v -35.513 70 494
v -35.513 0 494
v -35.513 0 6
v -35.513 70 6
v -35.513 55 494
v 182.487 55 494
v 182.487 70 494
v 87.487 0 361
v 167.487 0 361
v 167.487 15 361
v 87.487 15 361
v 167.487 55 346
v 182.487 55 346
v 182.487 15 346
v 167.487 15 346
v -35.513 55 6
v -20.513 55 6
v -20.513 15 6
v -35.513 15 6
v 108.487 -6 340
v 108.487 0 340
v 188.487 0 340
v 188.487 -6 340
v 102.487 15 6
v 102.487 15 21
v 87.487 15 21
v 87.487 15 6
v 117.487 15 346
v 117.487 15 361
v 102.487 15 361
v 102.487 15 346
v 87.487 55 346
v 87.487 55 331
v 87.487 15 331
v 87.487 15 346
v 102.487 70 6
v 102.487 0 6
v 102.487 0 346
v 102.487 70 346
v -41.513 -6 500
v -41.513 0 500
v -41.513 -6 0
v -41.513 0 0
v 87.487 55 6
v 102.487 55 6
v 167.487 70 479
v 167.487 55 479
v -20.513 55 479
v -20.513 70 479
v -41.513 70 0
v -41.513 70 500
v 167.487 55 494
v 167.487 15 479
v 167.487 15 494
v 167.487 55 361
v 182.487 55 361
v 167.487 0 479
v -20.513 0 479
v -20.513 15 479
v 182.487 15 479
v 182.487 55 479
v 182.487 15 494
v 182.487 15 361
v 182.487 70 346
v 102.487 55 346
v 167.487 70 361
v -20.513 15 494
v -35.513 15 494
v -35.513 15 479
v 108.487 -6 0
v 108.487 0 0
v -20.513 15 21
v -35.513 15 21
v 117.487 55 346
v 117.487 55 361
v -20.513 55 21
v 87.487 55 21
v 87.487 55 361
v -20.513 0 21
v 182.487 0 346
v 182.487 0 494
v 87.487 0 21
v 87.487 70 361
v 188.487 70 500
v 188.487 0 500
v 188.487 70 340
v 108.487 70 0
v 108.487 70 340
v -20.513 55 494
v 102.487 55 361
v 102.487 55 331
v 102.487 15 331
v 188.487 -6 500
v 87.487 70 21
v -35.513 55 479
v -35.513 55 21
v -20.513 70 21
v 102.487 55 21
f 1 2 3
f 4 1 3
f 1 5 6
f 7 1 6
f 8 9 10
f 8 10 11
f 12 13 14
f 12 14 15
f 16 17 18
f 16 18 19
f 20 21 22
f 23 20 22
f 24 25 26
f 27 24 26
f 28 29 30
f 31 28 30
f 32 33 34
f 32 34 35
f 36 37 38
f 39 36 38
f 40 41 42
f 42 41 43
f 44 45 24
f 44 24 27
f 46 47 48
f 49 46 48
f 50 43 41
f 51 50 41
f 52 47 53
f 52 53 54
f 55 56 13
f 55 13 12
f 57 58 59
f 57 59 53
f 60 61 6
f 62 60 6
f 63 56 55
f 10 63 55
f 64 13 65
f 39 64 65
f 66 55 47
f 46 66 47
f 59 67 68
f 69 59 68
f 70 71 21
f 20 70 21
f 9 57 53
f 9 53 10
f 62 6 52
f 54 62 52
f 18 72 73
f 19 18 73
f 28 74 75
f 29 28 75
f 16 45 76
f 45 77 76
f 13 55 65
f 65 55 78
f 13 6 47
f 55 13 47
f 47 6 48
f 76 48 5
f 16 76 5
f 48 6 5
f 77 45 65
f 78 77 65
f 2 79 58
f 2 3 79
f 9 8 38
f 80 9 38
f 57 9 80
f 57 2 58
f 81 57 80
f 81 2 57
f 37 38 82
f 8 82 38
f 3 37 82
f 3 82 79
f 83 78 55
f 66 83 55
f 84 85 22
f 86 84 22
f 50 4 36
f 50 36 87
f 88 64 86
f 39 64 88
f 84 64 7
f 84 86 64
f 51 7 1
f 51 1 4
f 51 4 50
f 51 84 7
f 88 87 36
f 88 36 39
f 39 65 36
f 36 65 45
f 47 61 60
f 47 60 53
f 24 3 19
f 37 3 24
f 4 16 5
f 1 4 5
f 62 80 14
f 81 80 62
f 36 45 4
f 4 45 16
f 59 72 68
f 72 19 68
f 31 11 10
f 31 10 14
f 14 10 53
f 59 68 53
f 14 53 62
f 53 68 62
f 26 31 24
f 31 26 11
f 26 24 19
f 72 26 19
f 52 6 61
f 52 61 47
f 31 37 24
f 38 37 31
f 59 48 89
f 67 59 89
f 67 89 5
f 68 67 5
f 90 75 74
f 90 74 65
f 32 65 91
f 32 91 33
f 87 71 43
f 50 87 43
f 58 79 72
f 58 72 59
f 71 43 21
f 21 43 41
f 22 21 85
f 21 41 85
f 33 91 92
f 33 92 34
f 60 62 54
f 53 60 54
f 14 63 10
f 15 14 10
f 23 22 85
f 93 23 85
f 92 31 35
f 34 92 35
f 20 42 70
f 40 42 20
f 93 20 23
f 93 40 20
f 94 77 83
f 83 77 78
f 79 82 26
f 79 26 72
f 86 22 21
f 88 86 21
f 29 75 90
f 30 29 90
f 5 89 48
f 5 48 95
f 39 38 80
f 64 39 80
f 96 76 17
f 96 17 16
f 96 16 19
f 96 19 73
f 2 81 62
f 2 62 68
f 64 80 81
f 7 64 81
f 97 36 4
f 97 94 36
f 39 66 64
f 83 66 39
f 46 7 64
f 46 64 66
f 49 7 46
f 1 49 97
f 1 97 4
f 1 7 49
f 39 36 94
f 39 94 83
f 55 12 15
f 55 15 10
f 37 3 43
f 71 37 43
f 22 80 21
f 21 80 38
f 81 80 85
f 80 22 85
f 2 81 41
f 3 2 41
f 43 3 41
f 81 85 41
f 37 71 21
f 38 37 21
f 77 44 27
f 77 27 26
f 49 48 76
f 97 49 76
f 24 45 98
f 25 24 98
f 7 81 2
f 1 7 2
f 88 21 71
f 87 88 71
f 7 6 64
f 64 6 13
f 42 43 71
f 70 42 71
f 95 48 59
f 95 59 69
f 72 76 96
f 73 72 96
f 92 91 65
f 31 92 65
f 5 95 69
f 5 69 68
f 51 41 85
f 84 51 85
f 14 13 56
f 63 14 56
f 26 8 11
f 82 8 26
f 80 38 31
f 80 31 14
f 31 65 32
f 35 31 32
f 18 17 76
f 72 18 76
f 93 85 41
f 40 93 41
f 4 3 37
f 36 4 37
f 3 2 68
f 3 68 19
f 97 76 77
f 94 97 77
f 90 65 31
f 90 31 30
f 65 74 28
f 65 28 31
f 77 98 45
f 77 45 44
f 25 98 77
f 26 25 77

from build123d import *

# Parameters (mm, degrees)
F1_DEPTH = 6
F2_W     = 218
F2_H     = 6
F2_W_2   = 74
F3_DEPTH = 70
F4_W     = 15
F4_H     = 458
F5_DEPTH = 15
F6_W     = 15
F6_H     = 15
F7_DEPTH = 40
F8_W     = 15
F8_H     = 118
F9_DEPTH = 15


with BuildPart() as f1:
    # F0 (on Front) → F1 (new body)
    with BuildSketch(Plane.XZ):
        Polygon((-41.512914, 500), (-41.512914, 0), (108.487086, 0), (108.487086, 340), (188.487086, 340), (188.487086, 500), align=None)
    extrude(amount=F1_DEPTH)


with BuildPart() as f3:
    # F2 (on face) → F3 (new body)
    with BuildSketch(Plane(origin=(0, 0, 0), x_dir=(-1, 0, 0), z_dir=(0, 1, 0))):
        Polygon((-182.487086, 500), (-188.487086, 500), (-188.487086, 340), (-182.487086, 340), (-182.487086, 346), (-182.487086, 494), align=None)
        with Locations((-73.487086, 497)):
            Rectangle(F2_W, F2_H)
        Polygon((41.512914, 500), (35.512914, 500), (35.512914, 494), (35.512914, 6), (41.512914, 6), align=None)
        with Locations((-145.487086, 343)):
            Rectangle(F2_W_2, F2_H)
        Polygon((-108.487086, 346), (-108.487086, 340), (-108.487086, 0), (-102.487086, 0), (-102.487086, 6), (-102.487086, 346), align=None)
        Polygon((41.512914, 6), (35.512914, 6), (-102.487086, 6), (-102.487086, 0), (41.512914, 0), align=None)
    extrude(amount=F3_DEPTH)


with BuildPart() as f5:
    # F4 (on face) → F5 (new body)
    with BuildSketch(Plane.XZ):
        Polygon((182.487086, 494), (-35.512914, 494), (-35.512914, 479), (-20.512914, 479), (167.487086, 479), (182.487086, 479), align=None)
        with Locations((-28.012914, 250)):
            Rectangle(F4_W, F4_H)
        Polygon((182.487086, 346), (182.487086, 479), (167.487086, 479), (167.487086, 361), (167.487086, 346), align=None)
        Polygon((-20.512914, 21), (-35.512914, 21), (-35.512914, 6), (87.487086, 6), (87.487086, 21), align=None)
        Polygon((167.487086, 346), (167.487086, 361), (87.487086, 361), (87.487086, 346), (102.487086, 346), align=None)
        Polygon((87.487086, 346), (87.487086, 21), (87.487086, 6), (102.487086, 6), (102.487086, 346), align=None)
    extrude(amount=-F5_DEPTH)


with BuildPart() as f7:
    # F6 (on face) → F7 (new body)
    with BuildSketch(Plane(origin=(0, 15, 0), x_dir=(-1, 0, 0), z_dir=(0, 1, 0))):
        with Locations((-174.987086, 486.5)):
            Rectangle(F6_W, F6_H)
        with Locations((-174.987086, 353.5)):
            Rectangle(F6_W, F6_H)
        with Locations((-109.987086, 353.5)):
            Rectangle(F6_W, F6_H)
        with Locations((-94.987086, 338.5)):
            Rectangle(F6_W, F6_H)
        with Locations((-94.987086, 13.5)):
            Rectangle(F6_W, F6_H)
        with Locations((28.012914, 13.5)):
            Rectangle(F6_W, F6_H)
        with Locations((28.012914, 486.5)):
            Rectangle(F6_W, F6_H)
    extrude(amount=F7_DEPTH)


with BuildPart() as f9:
    # F8 (on face) → F9 (new body)
    with BuildSketch(Plane(origin=(0, 55, 0), x_dir=(-1, 0, 0), z_dir=(0, 1, 0))):
        Polygon((35.512914, 494), (-182.487086, 494), (-182.487086, 479), (-167.487086, 479), (20.512914, 479), (35.512914, 479), align=None)
        with Locations((-174.987086, 420)):
            Rectangle(F8_W, F8_H)
        Polygon((35.512914, 6), (35.512914, 479), (20.512914, 479), (20.512914, 21), (20.512914, 6), align=None)
        Polygon((-167.487086, 361), (-182.487086, 361), (-182.487086, 346), (-102.487086, 346), (-102.487086, 361), align=None)
        Polygon((20.512914, 6), (20.512914, 21), (-87.487086, 21), (-102.487086, 21), (-102.487086, 6), align=None)
        Polygon((-87.487086, 361), (-102.487086, 361), (-102.487086, 346), (-102.487086, 21), (-87.487086, 21), align=None)
    extrude(amount=F9_DEPTH)


solid = Compound([f1.part, f3.part, f5.part, f7.part, f9.part])
